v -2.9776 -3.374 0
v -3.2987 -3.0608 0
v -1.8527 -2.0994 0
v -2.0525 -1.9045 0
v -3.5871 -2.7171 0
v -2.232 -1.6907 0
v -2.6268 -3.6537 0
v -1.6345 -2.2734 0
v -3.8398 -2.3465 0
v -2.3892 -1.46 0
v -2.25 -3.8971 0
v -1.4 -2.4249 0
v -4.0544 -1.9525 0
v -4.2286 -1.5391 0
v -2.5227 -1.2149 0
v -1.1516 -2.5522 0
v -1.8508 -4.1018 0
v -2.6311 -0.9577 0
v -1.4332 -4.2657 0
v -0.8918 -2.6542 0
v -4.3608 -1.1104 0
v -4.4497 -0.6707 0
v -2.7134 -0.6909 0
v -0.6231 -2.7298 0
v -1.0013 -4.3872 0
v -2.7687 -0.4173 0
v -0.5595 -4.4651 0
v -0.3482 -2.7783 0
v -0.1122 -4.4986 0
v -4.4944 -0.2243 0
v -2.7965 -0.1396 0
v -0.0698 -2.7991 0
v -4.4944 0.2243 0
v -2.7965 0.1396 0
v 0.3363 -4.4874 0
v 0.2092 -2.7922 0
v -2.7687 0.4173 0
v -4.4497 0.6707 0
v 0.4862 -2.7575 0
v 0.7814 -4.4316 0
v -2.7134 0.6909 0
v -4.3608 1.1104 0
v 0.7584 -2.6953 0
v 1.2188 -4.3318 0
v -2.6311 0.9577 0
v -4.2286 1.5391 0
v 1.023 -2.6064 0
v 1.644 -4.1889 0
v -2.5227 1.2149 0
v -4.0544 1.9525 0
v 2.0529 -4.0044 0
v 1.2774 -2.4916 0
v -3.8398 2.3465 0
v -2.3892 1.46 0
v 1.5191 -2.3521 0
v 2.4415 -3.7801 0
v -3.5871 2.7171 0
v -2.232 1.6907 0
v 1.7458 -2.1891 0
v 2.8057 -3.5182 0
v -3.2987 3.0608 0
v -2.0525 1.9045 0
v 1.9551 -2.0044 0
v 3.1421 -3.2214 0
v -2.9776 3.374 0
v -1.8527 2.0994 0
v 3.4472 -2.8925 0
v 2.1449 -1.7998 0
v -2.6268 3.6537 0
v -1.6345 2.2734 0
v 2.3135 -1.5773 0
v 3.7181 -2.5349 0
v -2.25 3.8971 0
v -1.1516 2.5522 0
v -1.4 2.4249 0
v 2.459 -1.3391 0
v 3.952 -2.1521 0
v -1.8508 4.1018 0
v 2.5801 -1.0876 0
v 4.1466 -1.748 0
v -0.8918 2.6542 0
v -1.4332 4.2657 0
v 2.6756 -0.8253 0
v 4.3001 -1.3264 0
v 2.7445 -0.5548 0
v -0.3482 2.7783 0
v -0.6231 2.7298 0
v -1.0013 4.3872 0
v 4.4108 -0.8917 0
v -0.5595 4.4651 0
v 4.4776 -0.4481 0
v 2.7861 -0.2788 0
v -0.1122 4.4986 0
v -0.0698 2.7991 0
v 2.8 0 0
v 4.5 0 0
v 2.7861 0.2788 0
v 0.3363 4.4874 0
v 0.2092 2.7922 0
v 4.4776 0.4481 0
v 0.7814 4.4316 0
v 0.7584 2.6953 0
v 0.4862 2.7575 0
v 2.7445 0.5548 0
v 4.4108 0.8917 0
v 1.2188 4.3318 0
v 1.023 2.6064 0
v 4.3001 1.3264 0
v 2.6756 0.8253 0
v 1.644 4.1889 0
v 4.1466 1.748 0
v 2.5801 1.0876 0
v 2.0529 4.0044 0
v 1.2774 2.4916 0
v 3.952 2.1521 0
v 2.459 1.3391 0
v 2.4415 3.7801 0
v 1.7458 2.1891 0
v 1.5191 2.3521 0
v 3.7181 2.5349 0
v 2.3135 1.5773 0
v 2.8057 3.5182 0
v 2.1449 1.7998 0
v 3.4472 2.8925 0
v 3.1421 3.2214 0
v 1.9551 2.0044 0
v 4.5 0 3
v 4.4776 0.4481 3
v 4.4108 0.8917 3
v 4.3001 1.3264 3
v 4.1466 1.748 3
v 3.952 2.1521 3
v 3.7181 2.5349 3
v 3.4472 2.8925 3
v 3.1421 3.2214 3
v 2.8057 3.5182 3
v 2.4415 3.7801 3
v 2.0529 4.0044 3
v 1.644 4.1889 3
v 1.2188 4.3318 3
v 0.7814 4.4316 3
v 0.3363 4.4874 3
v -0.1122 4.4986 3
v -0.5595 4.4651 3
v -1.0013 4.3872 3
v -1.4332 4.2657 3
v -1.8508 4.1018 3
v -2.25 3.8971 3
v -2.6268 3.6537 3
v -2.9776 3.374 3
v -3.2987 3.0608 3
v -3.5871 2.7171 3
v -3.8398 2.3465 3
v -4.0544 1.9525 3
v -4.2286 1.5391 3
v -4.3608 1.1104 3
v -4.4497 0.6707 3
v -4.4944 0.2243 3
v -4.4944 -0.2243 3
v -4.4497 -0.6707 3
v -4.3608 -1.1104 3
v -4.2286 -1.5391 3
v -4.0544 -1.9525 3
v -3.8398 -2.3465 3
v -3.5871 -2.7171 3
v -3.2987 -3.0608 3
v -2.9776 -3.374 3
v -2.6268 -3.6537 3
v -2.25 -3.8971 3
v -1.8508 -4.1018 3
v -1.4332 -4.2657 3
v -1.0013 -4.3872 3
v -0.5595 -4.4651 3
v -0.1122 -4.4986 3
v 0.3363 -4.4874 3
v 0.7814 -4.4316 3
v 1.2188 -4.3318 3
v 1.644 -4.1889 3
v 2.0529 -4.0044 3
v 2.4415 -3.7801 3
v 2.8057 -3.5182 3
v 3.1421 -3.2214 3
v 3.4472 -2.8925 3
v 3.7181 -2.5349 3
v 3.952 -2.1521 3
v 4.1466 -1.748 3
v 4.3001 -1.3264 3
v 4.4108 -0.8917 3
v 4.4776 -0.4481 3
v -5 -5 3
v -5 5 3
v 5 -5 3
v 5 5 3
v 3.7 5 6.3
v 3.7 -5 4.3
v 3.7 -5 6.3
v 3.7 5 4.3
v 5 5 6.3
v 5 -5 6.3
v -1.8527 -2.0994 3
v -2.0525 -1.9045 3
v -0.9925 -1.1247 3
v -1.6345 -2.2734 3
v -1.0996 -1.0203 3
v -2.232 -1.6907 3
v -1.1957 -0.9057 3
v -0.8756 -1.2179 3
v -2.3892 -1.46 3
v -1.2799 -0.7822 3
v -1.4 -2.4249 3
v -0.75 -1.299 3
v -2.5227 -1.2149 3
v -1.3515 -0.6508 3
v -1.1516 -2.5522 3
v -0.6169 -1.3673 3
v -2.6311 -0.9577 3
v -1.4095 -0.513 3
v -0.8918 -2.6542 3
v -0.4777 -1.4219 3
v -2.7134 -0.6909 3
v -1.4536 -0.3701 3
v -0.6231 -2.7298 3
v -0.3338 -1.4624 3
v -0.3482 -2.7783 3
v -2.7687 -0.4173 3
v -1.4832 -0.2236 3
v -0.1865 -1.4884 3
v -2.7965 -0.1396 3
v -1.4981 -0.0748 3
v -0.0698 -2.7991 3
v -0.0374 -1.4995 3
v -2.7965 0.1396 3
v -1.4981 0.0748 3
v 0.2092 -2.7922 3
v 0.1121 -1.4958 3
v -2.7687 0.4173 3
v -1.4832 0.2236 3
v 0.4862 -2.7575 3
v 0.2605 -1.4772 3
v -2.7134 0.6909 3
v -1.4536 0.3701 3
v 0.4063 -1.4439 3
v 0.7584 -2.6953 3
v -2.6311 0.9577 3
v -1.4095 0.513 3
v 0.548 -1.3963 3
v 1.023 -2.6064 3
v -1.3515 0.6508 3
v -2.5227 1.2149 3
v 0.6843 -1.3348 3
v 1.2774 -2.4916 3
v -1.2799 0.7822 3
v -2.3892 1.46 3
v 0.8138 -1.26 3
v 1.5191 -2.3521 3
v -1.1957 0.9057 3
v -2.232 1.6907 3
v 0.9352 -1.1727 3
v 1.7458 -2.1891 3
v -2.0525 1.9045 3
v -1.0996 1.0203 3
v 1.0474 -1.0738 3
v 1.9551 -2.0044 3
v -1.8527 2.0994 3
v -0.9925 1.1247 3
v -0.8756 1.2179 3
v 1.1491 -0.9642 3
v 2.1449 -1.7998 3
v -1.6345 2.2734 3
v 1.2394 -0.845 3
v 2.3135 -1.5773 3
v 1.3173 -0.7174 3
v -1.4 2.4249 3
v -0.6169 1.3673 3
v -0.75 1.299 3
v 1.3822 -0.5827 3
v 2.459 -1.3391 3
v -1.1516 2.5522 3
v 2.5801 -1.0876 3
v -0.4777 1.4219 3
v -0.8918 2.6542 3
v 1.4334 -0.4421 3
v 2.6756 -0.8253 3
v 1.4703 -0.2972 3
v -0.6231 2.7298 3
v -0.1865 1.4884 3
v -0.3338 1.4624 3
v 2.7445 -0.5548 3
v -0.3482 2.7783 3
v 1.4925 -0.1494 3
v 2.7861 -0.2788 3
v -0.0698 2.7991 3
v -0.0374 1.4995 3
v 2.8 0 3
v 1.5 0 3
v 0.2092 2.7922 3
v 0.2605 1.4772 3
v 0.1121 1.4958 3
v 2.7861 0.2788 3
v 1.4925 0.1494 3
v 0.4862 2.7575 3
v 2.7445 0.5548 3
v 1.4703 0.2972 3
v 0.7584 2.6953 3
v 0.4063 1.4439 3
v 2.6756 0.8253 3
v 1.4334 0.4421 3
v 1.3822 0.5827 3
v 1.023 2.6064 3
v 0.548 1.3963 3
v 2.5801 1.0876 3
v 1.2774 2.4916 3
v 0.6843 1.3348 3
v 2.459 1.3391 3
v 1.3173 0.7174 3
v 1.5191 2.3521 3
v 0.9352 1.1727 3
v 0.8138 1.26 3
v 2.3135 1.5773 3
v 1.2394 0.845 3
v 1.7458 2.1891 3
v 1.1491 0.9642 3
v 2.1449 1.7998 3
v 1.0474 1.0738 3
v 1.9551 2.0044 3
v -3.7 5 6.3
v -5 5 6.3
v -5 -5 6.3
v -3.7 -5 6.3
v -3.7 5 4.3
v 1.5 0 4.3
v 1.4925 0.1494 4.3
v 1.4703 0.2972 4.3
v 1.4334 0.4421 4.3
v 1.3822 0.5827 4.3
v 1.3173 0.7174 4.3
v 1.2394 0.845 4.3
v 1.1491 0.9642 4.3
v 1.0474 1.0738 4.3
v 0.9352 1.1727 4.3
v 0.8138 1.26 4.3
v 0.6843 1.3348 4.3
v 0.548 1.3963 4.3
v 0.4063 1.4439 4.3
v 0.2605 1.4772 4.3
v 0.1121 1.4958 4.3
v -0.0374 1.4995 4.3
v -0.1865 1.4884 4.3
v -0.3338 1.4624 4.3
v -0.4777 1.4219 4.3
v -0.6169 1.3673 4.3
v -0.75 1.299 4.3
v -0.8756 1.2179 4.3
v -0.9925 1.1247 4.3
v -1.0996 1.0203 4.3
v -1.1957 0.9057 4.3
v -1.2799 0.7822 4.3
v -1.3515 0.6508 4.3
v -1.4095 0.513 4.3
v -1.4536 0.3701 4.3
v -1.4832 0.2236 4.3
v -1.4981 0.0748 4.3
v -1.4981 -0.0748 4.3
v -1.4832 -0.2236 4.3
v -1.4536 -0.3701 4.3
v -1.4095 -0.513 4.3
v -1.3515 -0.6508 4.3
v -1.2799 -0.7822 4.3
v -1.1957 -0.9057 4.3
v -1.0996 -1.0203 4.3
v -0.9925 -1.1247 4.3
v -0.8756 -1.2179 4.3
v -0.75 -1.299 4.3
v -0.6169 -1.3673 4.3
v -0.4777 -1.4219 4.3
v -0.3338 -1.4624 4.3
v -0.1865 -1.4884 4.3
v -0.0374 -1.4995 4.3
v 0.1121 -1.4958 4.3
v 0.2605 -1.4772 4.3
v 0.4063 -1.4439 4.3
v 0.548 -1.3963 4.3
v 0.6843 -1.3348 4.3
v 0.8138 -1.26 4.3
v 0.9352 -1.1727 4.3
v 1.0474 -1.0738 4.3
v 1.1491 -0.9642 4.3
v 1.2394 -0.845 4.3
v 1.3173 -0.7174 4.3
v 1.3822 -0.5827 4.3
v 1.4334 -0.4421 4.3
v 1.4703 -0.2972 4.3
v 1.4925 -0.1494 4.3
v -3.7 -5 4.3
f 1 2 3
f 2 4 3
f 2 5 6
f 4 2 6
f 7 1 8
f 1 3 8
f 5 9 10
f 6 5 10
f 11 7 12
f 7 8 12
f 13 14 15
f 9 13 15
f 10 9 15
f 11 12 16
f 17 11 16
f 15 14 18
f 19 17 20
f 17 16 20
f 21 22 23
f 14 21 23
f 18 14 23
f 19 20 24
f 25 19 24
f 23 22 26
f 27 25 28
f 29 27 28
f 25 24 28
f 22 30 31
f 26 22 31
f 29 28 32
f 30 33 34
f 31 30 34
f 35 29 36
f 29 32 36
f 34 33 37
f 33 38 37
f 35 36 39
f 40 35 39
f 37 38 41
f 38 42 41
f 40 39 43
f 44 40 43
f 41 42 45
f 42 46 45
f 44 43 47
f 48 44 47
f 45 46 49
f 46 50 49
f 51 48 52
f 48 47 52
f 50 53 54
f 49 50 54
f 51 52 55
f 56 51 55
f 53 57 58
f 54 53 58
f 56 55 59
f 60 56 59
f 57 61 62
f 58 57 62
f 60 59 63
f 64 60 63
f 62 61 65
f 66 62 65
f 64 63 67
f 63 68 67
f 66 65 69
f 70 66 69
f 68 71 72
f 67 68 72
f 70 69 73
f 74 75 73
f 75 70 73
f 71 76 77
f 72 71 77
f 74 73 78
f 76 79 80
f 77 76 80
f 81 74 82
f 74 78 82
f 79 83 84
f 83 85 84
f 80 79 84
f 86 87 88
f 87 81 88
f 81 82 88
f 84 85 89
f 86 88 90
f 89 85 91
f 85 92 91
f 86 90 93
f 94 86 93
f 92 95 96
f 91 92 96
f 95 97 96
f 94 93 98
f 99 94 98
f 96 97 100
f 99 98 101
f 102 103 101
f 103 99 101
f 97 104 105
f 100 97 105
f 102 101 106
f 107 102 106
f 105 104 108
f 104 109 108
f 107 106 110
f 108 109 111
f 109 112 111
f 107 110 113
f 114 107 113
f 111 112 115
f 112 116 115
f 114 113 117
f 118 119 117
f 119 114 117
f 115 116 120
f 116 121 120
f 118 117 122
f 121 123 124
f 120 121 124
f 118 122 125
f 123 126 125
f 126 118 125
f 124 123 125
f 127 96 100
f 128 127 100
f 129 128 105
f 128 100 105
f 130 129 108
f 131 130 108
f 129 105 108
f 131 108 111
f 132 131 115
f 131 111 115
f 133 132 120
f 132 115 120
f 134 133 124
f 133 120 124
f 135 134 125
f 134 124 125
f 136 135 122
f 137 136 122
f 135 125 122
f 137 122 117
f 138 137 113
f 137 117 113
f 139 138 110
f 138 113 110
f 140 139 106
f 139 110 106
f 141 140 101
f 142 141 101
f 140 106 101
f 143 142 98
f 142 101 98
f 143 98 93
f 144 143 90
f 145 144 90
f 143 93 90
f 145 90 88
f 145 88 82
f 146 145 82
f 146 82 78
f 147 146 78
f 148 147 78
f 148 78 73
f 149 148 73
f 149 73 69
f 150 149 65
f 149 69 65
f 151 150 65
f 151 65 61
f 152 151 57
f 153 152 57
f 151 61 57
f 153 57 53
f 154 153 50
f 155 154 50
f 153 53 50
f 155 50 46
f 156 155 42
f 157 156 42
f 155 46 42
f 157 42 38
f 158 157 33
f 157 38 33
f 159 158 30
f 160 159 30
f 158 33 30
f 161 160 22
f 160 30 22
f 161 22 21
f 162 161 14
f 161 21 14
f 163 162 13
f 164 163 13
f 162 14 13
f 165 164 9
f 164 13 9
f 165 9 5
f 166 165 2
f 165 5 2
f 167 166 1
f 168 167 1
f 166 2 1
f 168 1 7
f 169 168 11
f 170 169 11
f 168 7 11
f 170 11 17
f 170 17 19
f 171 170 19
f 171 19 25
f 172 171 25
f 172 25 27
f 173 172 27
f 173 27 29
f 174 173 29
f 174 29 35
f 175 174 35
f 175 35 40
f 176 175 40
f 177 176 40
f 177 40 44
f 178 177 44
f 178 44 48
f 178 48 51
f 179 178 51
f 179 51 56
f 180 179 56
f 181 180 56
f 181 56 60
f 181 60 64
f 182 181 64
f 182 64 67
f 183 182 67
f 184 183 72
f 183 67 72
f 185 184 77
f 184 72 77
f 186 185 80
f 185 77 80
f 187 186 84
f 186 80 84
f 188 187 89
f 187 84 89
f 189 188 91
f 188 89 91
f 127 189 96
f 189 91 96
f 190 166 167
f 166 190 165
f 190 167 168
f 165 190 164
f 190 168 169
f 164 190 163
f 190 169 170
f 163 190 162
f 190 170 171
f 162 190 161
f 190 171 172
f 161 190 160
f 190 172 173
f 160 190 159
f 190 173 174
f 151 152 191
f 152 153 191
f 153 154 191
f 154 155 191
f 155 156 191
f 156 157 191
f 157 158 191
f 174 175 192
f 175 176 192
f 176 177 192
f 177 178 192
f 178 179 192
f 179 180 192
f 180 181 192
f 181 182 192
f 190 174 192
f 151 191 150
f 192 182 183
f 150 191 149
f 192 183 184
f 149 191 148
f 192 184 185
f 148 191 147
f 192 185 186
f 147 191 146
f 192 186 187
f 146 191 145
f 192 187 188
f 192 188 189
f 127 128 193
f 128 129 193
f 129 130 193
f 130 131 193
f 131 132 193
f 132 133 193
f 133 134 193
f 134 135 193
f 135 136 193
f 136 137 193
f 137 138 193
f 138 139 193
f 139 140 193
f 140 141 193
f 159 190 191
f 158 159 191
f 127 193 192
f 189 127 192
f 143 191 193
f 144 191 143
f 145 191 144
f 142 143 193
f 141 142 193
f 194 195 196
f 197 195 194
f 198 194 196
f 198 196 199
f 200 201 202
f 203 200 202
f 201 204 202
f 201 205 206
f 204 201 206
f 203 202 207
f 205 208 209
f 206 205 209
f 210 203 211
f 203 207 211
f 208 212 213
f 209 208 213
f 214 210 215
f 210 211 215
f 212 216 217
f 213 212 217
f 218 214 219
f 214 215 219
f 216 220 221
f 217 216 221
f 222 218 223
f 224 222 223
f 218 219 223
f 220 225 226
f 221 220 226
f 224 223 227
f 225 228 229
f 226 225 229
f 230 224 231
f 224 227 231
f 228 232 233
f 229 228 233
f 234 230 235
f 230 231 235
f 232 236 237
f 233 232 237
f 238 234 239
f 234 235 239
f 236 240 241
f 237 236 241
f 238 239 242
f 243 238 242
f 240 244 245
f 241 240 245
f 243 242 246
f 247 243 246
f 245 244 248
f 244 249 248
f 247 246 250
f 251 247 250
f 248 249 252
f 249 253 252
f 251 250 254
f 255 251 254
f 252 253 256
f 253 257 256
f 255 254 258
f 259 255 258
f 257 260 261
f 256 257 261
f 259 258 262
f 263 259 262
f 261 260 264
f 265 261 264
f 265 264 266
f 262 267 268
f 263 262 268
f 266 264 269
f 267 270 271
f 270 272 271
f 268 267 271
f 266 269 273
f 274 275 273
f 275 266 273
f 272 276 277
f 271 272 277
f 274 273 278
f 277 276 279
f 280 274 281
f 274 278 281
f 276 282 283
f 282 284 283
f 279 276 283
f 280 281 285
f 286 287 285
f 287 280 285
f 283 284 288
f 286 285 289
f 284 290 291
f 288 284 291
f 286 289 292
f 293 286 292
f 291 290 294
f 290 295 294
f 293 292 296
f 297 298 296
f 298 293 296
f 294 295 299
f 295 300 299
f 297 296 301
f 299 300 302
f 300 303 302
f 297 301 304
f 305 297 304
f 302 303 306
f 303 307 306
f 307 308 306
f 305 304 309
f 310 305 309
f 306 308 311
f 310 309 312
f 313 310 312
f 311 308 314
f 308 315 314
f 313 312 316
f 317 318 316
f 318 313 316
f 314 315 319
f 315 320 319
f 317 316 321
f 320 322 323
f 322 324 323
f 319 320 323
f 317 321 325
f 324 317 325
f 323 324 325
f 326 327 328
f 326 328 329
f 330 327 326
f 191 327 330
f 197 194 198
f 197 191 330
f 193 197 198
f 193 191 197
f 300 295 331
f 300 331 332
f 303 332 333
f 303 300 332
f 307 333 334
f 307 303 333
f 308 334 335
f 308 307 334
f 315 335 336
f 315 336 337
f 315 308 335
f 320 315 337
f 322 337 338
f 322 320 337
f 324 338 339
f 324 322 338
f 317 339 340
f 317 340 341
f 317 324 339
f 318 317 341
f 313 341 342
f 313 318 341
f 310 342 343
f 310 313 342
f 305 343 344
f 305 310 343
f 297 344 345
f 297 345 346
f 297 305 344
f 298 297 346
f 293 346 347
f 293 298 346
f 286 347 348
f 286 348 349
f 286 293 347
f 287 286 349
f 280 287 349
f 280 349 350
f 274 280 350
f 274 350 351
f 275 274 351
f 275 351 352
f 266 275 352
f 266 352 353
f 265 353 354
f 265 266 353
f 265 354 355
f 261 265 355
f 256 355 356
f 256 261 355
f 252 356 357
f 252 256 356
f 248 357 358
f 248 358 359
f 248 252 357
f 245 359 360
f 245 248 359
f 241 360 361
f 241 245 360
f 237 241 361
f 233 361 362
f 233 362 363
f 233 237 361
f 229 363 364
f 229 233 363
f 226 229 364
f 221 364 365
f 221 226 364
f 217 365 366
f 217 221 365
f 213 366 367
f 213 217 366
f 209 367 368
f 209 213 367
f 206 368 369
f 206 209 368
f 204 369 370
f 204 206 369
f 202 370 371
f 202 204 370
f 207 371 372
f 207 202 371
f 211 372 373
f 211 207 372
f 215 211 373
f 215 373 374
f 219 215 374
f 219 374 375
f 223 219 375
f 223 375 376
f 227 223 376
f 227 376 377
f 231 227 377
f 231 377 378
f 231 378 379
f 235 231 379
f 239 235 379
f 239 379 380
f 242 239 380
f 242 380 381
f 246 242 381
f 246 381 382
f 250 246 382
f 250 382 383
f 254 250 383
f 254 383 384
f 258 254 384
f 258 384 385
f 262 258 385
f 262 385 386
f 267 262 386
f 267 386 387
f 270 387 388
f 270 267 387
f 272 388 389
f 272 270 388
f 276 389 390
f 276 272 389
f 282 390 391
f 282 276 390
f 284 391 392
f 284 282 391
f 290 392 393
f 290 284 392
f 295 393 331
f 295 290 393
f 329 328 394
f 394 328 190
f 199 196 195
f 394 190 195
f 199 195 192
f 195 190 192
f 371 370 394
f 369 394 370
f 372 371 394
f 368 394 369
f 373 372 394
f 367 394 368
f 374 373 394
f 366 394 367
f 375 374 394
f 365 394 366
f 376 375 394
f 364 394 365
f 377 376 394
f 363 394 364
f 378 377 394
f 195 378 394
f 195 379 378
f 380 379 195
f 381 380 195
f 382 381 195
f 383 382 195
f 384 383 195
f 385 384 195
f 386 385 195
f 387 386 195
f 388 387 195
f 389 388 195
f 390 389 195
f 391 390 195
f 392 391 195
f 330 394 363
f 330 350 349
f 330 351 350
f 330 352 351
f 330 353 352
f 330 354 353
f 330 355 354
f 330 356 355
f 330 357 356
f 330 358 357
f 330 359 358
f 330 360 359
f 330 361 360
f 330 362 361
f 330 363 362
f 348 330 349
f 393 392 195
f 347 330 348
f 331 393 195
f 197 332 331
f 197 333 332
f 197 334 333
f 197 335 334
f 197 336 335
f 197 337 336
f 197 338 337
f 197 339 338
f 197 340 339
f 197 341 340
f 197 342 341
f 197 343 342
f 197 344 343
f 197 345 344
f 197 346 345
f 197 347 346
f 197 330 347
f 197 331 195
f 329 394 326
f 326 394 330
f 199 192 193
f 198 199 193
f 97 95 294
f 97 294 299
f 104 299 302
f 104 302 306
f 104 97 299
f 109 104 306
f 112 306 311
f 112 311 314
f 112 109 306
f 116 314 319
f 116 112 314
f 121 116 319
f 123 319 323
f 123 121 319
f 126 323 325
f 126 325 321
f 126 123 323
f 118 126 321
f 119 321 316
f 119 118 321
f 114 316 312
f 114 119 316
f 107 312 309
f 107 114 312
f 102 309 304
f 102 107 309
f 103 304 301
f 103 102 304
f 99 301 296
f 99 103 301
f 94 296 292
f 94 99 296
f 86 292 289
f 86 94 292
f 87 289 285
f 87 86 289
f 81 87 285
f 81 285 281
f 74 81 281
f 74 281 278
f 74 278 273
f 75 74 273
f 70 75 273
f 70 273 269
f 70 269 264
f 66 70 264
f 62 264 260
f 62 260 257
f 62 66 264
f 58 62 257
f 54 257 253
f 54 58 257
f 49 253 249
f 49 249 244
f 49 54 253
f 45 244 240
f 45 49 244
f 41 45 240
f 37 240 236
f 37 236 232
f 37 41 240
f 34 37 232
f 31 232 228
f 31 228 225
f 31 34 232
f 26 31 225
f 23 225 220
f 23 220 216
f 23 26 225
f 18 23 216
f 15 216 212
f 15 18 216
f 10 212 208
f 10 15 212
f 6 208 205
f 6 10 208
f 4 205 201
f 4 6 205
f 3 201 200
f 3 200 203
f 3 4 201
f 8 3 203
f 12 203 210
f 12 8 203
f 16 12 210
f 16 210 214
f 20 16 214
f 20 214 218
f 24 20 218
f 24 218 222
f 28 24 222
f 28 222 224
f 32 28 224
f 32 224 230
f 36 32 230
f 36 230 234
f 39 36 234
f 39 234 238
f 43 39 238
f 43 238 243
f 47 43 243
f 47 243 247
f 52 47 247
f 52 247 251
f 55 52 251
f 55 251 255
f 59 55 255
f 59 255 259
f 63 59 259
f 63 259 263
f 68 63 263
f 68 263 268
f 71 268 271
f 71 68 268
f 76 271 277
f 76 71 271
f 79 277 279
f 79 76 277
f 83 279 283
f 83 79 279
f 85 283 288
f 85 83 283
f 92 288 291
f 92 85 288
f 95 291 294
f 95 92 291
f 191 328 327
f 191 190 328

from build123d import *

# Parameters (mm, degrees)
SKETCH1_R           = 4.5
SKETCH1_R_2         = 2.8
BOSS_EXTRUDE1_DEPTH = 3
SKETCH2_W           = 10
SKETCH2_H           = 10
SKETCH2_R           = 1.5
BOSS_EXTRUDE2_DEPTH = 1.3
SKETCH3_W           = 1.3
SKETCH3_H           = 10
BOSS_EXTRUDE3_DEPTH = 2


with BuildPart() as part:
    # Sketch1 → Boss-Extrude1 (new body)
    with BuildSketch(Plane.XY):
        Circle(SKETCH1_R)
        Circle(SKETCH1_R_2, mode=Mode.SUBTRACT)
    extrude(amount=BOSS_EXTRUDE1_DEPTH)

    # Sketch2 → Boss-Extrude2 (add)
    with BuildSketch(Plane.XY.offset(3)):
        Rectangle(SKETCH2_W, SKETCH2_H)
        Circle(SKETCH2_R, mode=Mode.SUBTRACT)
    extrude(amount=BOSS_EXTRUDE2_DEPTH)

    # Sketch3 → Boss-Extrude3 (add)
    with BuildSketch(Plane.XY.offset(4.3)):
        with Locations((-4.35, 0)):
            Rectangle(SKETCH3_W, SKETCH3_H)
        with Locations((4.35, 0)):
            Rectangle(SKETCH3_W, SKETCH3_H)
    extrude(amount=BOSS_EXTRUDE3_DEPTH)


solid = part.part
